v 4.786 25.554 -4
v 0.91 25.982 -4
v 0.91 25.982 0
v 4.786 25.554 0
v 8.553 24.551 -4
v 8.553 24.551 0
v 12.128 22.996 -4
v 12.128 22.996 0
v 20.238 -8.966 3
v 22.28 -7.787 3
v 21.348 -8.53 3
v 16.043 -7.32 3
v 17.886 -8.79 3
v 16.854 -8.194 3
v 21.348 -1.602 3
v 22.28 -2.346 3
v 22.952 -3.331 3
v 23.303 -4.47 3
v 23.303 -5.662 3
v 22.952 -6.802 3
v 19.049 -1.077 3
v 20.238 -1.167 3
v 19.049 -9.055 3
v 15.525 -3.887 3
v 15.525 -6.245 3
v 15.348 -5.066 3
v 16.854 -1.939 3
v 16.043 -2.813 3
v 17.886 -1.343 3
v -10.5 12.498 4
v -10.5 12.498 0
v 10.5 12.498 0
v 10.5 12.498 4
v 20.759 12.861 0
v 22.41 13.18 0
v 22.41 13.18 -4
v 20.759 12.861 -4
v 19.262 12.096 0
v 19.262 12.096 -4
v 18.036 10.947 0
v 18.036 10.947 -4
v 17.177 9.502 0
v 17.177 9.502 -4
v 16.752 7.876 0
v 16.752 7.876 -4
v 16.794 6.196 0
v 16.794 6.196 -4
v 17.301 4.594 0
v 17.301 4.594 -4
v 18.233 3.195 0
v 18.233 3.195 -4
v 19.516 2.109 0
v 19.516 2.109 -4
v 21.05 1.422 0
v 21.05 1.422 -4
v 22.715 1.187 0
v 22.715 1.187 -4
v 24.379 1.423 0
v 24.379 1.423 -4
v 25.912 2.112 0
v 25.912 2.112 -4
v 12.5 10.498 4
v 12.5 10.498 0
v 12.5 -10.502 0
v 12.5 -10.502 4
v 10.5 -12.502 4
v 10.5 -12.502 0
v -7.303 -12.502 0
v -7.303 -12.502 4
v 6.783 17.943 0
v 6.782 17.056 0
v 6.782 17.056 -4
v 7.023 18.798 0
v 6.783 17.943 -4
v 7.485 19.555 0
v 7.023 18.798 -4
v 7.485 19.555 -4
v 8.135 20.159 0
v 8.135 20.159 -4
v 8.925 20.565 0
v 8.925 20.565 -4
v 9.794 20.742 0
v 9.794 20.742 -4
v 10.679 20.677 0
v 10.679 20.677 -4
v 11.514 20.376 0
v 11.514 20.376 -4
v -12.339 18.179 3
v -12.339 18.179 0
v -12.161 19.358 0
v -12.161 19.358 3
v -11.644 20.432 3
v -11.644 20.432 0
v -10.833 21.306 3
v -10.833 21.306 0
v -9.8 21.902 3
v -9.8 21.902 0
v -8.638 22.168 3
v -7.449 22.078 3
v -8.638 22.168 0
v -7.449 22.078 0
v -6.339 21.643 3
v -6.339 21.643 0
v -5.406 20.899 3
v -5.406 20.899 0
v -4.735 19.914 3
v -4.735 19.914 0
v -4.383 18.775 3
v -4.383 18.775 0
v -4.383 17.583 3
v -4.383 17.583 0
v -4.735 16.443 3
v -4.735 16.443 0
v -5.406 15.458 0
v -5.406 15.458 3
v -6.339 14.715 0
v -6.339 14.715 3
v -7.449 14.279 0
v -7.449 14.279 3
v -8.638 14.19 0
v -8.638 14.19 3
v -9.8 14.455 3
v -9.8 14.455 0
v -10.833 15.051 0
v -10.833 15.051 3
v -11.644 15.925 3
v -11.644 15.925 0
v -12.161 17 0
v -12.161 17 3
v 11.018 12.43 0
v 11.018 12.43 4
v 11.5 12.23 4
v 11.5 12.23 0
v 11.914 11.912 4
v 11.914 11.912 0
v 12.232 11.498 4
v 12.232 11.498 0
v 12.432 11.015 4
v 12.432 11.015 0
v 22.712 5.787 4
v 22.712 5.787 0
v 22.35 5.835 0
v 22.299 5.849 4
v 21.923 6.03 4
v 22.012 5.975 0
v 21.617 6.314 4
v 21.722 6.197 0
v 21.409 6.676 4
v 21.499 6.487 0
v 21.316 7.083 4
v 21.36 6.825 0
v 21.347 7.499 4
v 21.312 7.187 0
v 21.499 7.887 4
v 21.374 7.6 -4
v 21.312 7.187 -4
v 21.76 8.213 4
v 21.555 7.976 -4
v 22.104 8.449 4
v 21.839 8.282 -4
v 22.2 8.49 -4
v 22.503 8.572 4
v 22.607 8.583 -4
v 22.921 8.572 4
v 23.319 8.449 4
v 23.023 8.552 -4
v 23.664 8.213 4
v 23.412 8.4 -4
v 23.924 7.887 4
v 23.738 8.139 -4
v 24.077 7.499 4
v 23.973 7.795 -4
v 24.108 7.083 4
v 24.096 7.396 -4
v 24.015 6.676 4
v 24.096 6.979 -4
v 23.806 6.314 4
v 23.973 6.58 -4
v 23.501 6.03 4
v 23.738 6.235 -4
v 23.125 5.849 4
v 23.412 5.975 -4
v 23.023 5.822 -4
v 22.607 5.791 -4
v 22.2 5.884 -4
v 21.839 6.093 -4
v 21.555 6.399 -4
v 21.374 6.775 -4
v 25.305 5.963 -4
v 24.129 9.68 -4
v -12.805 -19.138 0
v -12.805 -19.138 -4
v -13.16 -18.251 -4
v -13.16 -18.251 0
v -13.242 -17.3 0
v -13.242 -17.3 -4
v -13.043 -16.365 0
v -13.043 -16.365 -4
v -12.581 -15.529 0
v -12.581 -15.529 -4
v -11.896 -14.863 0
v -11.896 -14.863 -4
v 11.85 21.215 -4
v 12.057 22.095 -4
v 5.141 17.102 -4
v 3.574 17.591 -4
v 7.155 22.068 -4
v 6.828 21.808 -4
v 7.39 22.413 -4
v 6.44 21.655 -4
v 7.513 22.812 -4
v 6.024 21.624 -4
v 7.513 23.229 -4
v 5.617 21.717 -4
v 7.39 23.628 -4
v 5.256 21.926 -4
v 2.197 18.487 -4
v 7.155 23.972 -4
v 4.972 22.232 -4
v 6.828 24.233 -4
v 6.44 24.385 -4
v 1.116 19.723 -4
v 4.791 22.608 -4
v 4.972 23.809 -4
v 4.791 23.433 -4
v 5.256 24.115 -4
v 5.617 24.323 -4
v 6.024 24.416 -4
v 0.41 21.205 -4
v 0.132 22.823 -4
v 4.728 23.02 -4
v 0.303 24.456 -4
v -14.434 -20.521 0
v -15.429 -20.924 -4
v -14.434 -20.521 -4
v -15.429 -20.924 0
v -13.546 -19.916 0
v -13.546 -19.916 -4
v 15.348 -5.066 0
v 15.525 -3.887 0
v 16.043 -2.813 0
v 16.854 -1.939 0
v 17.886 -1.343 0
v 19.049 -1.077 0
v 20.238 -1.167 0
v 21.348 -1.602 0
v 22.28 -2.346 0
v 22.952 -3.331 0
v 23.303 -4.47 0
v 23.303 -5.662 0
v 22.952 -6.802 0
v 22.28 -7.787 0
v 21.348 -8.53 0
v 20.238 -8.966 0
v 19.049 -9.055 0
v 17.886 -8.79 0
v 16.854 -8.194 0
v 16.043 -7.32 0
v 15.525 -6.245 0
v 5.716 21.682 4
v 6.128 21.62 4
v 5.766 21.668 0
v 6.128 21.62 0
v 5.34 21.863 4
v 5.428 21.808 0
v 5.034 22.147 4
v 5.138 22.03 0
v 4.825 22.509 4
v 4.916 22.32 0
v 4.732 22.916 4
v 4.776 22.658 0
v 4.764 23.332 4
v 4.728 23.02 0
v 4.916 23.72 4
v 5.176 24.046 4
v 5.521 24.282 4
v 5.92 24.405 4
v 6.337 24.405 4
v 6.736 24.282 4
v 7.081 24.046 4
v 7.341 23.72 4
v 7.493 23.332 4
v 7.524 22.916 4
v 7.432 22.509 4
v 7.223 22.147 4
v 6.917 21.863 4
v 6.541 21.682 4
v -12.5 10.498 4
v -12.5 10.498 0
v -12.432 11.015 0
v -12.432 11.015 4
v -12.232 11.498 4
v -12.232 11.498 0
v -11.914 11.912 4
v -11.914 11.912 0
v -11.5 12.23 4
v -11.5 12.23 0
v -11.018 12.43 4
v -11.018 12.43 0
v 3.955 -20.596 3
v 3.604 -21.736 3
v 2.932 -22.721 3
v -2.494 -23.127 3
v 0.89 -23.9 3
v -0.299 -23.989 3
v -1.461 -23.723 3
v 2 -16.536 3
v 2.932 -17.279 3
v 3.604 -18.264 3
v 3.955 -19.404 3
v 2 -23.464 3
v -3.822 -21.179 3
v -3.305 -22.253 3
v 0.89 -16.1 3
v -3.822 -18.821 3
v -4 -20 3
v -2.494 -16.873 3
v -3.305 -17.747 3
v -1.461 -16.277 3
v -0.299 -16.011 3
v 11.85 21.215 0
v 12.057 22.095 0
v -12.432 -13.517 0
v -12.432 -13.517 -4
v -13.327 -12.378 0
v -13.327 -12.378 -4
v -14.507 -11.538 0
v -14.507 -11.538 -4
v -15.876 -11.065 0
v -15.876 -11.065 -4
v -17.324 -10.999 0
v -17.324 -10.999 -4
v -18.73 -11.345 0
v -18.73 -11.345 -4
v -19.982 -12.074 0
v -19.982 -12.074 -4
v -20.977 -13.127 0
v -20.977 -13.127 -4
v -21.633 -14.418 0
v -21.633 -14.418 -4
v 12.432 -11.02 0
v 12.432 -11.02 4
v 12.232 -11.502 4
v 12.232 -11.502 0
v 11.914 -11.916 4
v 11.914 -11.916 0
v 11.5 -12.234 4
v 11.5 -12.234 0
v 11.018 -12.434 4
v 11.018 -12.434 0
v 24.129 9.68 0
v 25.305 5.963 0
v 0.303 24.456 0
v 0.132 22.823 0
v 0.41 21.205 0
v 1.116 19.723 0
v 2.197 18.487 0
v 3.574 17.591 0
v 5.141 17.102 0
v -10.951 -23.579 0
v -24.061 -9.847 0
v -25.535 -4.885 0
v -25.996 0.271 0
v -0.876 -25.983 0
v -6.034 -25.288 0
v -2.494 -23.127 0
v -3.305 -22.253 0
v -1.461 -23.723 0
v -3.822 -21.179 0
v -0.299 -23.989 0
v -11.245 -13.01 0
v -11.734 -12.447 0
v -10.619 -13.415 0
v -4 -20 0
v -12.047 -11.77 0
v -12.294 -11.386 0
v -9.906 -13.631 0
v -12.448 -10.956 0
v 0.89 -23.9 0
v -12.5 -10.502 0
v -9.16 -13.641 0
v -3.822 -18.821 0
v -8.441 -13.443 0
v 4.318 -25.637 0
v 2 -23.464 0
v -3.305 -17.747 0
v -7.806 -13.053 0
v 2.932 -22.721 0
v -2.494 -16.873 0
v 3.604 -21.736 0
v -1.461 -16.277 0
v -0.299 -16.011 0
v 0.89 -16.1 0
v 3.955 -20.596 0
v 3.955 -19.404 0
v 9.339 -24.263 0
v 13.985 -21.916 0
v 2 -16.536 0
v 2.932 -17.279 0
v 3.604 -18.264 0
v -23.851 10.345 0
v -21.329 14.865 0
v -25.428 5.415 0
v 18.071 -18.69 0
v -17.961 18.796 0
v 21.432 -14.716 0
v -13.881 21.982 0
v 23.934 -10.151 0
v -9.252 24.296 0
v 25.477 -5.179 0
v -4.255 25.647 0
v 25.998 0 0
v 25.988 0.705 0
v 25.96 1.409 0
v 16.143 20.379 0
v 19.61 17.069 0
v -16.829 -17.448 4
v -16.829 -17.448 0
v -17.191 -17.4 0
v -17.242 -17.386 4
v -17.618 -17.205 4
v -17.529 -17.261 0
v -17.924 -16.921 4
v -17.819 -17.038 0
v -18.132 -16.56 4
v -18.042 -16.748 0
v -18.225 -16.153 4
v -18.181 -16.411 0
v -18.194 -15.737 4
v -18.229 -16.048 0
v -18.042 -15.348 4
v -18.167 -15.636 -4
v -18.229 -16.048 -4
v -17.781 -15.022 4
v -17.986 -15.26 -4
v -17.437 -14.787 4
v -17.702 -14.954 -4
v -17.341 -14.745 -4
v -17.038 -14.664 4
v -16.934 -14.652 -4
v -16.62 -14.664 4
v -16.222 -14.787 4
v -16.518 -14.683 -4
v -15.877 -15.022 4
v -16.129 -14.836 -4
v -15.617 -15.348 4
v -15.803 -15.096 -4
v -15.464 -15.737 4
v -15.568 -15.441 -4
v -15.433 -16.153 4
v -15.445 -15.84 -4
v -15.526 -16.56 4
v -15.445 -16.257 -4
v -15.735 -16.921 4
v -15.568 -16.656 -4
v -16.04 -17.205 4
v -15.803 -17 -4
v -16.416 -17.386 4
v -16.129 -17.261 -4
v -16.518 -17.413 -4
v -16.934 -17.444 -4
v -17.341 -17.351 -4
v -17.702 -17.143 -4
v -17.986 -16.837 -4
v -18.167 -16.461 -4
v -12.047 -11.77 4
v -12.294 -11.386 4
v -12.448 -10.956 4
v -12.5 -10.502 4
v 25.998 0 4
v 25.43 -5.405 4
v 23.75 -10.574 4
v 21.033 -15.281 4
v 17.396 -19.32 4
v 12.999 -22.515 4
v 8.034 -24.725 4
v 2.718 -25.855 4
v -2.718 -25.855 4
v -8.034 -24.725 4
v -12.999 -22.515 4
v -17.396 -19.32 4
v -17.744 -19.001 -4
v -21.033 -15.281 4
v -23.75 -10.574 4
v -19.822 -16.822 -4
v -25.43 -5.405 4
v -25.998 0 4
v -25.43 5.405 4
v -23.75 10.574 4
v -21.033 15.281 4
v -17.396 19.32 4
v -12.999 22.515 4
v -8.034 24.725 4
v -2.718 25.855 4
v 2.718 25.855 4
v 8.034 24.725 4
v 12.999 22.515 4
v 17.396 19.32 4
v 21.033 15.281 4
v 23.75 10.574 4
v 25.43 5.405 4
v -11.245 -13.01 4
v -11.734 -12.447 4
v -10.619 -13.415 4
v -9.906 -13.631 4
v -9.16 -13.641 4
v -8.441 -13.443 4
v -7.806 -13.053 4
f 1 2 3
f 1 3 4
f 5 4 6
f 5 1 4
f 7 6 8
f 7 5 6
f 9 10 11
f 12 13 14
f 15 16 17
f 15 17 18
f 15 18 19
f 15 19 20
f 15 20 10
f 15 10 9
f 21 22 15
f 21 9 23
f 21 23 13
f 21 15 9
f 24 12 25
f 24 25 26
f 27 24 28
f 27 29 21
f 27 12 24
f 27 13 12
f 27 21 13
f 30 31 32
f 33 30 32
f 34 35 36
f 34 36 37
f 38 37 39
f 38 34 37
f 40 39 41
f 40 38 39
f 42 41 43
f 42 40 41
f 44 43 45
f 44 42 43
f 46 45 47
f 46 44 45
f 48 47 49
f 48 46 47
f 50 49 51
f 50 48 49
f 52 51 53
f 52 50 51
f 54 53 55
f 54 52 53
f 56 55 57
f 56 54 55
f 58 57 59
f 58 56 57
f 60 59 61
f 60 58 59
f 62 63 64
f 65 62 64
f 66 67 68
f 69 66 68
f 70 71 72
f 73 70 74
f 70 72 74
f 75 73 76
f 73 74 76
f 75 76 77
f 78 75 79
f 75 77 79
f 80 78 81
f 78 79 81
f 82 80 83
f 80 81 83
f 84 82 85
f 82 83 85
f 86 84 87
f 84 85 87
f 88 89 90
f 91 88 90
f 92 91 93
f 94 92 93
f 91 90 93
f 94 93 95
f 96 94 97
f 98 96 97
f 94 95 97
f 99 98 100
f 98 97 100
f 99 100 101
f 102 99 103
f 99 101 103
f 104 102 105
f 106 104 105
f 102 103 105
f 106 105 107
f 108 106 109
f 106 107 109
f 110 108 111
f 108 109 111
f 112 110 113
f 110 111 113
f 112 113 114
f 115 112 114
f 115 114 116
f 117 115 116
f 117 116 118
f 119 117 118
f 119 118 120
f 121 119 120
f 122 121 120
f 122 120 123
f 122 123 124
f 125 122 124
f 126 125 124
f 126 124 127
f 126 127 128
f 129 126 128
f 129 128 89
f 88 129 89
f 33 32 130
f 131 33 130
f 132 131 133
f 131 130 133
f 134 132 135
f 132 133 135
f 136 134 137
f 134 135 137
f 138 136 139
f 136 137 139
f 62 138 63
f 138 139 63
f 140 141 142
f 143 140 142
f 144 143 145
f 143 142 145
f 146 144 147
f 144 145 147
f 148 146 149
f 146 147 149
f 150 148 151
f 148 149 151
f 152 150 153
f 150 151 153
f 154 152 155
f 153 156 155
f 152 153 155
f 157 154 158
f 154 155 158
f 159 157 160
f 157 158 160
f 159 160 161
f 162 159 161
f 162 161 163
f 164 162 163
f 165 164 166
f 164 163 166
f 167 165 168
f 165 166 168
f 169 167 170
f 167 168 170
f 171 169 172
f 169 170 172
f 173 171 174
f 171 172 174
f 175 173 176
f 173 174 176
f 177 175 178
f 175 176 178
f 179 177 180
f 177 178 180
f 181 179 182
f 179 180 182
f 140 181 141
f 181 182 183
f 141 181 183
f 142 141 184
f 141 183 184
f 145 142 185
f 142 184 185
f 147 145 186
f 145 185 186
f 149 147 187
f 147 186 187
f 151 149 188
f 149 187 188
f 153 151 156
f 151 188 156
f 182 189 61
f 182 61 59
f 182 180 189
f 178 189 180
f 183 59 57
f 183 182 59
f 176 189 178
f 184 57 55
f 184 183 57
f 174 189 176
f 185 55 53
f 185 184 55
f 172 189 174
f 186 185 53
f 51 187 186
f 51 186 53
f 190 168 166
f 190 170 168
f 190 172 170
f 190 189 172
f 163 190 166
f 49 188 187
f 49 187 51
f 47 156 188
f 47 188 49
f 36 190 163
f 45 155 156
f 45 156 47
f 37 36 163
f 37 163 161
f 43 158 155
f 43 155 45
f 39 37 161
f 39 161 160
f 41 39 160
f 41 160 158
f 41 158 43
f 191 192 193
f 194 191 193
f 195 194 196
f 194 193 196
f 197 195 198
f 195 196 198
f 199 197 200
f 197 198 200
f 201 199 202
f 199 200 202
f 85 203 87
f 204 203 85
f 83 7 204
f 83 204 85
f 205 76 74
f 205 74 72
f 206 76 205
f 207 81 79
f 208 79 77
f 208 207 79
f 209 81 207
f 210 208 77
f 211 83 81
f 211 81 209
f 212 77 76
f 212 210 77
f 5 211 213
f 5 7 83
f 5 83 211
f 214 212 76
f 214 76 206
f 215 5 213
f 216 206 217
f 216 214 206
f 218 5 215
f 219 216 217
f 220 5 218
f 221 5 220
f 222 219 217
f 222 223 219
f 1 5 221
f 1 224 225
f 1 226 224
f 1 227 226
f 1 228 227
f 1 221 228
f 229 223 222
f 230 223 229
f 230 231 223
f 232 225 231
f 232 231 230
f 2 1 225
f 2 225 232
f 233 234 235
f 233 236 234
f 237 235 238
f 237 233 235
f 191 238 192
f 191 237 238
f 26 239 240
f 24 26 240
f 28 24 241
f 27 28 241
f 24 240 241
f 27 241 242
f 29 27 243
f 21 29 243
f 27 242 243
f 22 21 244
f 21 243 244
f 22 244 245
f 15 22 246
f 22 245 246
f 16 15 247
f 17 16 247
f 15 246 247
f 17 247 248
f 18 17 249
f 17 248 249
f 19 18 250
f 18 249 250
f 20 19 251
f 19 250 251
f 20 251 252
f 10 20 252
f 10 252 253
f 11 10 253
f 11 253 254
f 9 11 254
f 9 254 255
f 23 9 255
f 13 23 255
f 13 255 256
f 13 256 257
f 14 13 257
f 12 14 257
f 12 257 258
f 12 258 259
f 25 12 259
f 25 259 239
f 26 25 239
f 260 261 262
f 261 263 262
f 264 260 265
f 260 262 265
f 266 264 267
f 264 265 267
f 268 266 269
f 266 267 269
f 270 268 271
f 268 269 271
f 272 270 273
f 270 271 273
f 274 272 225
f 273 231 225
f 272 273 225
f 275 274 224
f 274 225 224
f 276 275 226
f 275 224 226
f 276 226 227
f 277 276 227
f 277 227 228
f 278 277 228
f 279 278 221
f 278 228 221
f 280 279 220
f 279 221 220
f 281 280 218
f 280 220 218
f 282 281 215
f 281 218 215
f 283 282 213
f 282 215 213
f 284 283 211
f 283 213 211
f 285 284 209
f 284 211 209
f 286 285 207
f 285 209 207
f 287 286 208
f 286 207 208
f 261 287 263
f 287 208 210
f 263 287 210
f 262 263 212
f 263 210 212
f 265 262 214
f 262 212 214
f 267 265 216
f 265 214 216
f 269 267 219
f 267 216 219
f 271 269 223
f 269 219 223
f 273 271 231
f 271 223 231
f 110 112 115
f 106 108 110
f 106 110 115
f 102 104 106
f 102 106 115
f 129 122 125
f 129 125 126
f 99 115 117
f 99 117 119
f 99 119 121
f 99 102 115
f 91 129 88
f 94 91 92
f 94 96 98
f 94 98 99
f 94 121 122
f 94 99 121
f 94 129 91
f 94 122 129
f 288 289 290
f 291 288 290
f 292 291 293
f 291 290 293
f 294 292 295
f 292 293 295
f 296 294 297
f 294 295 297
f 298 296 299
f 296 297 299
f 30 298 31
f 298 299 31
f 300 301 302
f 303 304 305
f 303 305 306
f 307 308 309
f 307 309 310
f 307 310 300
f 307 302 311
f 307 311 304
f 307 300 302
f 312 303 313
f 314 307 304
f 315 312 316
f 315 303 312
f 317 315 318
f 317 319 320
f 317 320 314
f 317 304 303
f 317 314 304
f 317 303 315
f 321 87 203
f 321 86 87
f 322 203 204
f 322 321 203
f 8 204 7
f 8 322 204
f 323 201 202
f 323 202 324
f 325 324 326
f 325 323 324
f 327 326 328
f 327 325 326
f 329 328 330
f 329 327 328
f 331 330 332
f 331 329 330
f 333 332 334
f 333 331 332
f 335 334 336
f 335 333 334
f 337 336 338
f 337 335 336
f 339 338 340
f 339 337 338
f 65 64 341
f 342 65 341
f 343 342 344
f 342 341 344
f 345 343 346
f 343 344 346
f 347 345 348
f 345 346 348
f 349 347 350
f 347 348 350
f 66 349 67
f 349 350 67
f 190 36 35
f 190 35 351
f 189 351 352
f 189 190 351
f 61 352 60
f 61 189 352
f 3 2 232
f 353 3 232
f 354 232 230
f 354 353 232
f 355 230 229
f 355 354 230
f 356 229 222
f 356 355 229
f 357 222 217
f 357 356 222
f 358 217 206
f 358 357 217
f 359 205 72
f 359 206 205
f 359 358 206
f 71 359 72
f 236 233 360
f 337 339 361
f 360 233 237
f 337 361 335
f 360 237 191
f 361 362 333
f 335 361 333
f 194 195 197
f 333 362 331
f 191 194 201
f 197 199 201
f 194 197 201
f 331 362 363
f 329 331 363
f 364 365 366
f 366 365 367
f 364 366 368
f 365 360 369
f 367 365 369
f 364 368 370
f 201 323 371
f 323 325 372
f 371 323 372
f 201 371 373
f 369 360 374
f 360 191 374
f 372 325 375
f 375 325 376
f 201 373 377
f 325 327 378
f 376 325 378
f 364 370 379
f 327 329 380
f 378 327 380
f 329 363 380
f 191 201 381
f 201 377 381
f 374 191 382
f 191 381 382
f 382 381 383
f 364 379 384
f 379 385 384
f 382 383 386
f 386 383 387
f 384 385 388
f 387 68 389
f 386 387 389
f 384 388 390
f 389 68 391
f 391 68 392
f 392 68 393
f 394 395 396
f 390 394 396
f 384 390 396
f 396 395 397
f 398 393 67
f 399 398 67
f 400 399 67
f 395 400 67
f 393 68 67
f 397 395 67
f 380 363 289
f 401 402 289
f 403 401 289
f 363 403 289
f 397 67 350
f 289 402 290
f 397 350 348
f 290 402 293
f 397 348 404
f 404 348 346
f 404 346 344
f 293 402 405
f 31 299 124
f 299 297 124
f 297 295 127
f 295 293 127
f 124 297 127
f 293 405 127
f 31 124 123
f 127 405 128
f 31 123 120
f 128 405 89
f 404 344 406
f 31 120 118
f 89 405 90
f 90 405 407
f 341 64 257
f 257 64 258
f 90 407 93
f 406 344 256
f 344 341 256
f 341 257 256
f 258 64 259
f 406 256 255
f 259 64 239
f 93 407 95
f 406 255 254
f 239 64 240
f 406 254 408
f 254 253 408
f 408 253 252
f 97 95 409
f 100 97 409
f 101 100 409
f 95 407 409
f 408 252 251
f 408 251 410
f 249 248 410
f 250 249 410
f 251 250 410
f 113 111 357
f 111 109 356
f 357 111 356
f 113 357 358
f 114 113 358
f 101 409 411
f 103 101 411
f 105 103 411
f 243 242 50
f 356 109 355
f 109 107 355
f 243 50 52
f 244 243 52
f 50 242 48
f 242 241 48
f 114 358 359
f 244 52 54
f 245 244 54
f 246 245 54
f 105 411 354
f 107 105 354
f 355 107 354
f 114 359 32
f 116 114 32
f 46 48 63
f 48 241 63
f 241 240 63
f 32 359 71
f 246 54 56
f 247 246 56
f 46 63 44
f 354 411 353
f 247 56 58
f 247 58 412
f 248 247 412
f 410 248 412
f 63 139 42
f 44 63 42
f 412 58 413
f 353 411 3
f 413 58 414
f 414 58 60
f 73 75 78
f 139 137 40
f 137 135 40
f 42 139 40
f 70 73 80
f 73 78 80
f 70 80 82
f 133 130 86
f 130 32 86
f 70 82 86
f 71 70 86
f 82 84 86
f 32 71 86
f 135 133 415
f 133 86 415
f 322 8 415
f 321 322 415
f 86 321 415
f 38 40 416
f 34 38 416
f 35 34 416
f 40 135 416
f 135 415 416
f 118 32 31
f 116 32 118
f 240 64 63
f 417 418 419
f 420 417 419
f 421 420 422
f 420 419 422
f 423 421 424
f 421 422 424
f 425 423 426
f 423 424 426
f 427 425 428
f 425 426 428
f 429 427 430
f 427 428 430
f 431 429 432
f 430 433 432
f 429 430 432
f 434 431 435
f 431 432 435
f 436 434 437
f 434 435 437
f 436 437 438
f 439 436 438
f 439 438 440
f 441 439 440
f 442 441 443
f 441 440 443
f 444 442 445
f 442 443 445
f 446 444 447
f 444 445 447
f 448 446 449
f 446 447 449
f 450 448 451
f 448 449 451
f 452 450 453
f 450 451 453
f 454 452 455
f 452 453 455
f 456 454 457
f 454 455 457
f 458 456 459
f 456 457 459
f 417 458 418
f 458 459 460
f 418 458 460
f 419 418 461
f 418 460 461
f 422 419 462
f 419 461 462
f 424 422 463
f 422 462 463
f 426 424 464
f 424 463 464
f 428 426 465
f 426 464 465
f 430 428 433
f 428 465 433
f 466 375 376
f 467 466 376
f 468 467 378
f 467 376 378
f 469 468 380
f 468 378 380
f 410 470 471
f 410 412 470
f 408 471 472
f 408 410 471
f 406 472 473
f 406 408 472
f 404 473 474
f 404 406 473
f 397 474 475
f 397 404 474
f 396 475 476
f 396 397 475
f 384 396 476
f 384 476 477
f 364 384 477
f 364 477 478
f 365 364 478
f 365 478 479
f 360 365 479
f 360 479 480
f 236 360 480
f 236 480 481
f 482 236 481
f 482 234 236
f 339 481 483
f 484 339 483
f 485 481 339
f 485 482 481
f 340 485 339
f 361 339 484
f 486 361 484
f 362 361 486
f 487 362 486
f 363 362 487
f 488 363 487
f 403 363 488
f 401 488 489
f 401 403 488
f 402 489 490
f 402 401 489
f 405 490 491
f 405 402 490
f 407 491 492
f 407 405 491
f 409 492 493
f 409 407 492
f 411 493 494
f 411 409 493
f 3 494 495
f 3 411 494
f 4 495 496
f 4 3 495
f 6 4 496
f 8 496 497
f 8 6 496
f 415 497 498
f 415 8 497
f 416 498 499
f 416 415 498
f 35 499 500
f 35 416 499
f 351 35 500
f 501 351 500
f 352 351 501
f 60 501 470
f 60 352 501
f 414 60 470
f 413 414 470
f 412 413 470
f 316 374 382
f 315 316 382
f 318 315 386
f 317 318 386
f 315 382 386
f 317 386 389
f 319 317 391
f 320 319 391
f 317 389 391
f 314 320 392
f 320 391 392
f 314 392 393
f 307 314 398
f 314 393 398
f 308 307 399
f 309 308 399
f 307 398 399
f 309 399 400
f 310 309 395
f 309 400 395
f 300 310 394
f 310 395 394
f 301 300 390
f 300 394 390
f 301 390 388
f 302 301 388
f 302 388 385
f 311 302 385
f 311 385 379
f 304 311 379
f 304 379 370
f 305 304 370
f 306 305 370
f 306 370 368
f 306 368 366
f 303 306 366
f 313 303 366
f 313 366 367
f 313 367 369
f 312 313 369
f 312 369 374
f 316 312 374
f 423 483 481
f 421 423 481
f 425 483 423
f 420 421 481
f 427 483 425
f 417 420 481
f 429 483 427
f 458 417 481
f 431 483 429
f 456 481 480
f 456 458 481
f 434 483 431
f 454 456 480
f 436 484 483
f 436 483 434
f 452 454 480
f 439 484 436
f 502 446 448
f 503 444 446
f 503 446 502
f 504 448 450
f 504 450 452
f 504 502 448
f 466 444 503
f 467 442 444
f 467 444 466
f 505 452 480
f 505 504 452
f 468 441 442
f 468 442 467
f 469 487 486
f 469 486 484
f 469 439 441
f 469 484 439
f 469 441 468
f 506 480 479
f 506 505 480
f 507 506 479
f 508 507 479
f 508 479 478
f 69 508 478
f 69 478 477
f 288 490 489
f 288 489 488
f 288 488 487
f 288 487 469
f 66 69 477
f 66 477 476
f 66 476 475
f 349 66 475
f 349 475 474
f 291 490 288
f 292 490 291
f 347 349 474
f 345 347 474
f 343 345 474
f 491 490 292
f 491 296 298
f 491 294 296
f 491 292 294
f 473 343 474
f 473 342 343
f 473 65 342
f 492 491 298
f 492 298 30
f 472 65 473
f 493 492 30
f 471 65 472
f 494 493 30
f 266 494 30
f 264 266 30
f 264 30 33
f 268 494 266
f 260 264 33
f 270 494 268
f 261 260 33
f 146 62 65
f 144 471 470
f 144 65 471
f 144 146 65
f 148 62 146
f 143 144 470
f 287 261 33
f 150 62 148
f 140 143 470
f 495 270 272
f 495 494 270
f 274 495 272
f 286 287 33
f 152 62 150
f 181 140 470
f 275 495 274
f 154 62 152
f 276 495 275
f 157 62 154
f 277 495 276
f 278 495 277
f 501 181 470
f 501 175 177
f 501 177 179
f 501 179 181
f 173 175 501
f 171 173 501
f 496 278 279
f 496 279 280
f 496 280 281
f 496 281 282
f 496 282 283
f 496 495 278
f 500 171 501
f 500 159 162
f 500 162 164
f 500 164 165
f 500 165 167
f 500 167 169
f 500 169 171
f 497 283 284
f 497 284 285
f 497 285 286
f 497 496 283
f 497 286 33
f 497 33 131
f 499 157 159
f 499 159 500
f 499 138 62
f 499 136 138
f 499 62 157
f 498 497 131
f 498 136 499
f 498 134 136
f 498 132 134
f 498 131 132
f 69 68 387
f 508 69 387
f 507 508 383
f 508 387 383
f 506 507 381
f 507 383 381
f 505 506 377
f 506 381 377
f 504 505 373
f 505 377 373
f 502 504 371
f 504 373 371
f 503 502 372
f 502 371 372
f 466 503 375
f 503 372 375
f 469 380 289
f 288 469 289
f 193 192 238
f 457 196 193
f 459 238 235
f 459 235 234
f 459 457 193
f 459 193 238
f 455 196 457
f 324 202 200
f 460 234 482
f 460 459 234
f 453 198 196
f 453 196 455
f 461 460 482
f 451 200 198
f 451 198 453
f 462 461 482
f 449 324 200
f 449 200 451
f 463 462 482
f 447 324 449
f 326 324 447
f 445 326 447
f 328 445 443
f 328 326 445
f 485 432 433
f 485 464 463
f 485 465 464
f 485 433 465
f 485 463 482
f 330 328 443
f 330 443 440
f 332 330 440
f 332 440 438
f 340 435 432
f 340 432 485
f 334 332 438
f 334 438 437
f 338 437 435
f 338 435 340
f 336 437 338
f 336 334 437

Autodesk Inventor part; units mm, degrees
ref_plane "YZ Plane" through (0, 0, 0) normal (1, 0, 0) x (0, 1, 0)
ref_plane "XZ Plane" through (0, 0, 0) normal (0, 1, 0) x (-1, 0, 0)
ref_plane "XY Plane" through (0, 0, 0) normal (0, 0, 1) x (1, 0, 0)
ref_plane "Work Plane1" through (0, 0, 0) normal (0, 0, 1) x (1, 0, 0)
sketch "Sketch1" plane through (0, 0, 0) normal (0, 0, 1) x (1, 0, 0)
  circle A0 centre (0, 0) radius 25.9979 projected
  circle A1 centre (-9.4998, -11.0022) radius 2.6601 projected
  circle A2 centre (0.0001, -0.0022) radius 3.8801 projected
  circle A3 centre (0.0001, -0.0022) radius 6.7754 projected
  line L0 (10.5001, -12.5022) -> (-10.4999, -12.5022)
  line L1 (-12.4999, -10.5022) -> (-12.4999, 10.4978)
  line L2 (-10.4999, 12.4978) -> (10.5001, 12.4978)
  line L3 (12.5001, 10.4978) -> (12.5001, -10.5022)
  line L4 (12.5001, -12.5022) -> (-12.4999, 12.4978) construction
  line L5 (-12.4999, -12.5022) -> (12.5001, 12.4978) construction
  arc A4 (-10.4999, 12.4978) -> (-12.4999, 10.4978) centre (-10.4999, 10.4978) ccw
  arc A5 (-12.4999, -10.5022) -> (-10.4999, -12.5022) centre (-10.4999, -10.5022) ccw
  arc A6 (10.5001, -12.5022) -> (12.5001, -10.5022) centre (10.5001, -10.5022) ccw
  arc A7 (12.5001, 10.4978) -> (10.5001, 12.4978) centre (10.5001, 10.4978) ccw
  point P0 (0, 0)
  point P1 (-7.3029, -12.5022)
  point P2 (-12.0467, -11.77)
  dimension "d17" = 25
  dimension "d18" = 25
  dimension "d19" = 2
extrude "Extrusion1" add sketch "Sketch1" along normal blind 4 contours A0
sketch "Skizze4" plane through (0, 0, 4) normal (0, 0, 1) x (1, 0, 0)
  spline S0 degree 2 poles (24.1427, 2.2394) (24.731, 1.8489) (25.3785, 0.5587) (25.3785, -0.3311) knots 0 0 0 1 2 2 2 construction
  spline S1 degree 2 poles (25.3785, -0.3311) (25.3785, -1.1665) (24.7013, -2.5111) (24.1328, -2.8867) knots 0 0 0 1 2 2 2 construction
  spline S2 degree 2 poles (24.1328, -2.8867) (23.6682, -3.1784) (22.7141, -3.3761) (21.9726, -3.3761) knots 0 0 0 1 2 2 2 construction
  line L0 (21.9726, -3.3761) -> (20.5687, -3.3761) construction
  line L1 (20.5687, -3.3761) -> (20.5687, 2.7239) construction
  line L2 (20.5687, 2.7239) -> (21.9578, 2.7239) construction
  spline S3 degree 2 poles (21.9578, 2.7239) (22.8179, 2.7239) (23.7967, 2.4668) (24.1427, 2.2394) knots 0 0 0 1 2 2 2 construction
  spline S4 degree 2 poles (19.1896, -2.9312) (18.8979, -3.1982) (18.1564, -3.4849) (17.5978, -3.4849) knots 0 0 0 1 2 2 2 construction
  spline S5 degree 2 poles (17.5978, -3.4849) (16.9354, -3.4849) (16.0061, -3.2081) (15.5958, -3.0103) knots 0 0 0 1 2 2 2 construction
  line L3 (15.5958, -3.0103) -> (15.5958, -1.992) construction
  line L4 (15.5958, -1.992) -> (15.6551, -1.992) construction
  spline S6 degree 2 poles (15.6551, -1.992) (16.0555, -2.3677) (17.0689, -2.7829) (17.5385, -2.7829) knots 0 0 0 1 2 2 2 construction
  spline S7 degree 2 poles (17.5385, -2.7829) (18.2108, -2.7829) (18.8979, -2.2243) (18.8979, -1.7646) knots 0 0 0 1 2 2 2 construction
  spline S8 degree 2 poles (18.8979, -1.7646) (18.8979, -1.3988) (18.5371, -0.944) (18.1465, -0.8303) knots 0 0 0 1 2 2 2 construction
  spline S9 degree 2 poles (18.1465, -0.8303) (17.8648, -0.7513) (17.3952, -0.6425) (17.0442, -0.5535) knots 0 0 0 1 2 2 2 construction
  spline S10 degree 2 poles (17.0442, -0.5535) (16.7278, -0.4695) (16.2285, -0.2174) (16.0358, -0.0147) knots 0 0 0 1 2 2 2 construction
  spline S11 degree 2 poles (16.0358, -0.0147) (15.8479, 0.188) (15.6403, 0.7317) (15.6403, 1.0876) knots 0 0 0 1 2 2 2 construction
  spline S12 degree 2 poles (15.6403, 1.0876) (15.6403, 1.8291) (16.797, 2.8326) (17.6918, 2.8326) knots 0 0 0 1 2 2 2 construction
  spline S13 degree 2 poles (17.6918, 2.8326) (18.2059, 2.8326) (19.1154, 2.6299) (19.5059, 2.4372) knots 0 0 0 1 2 2 2 construction
  line L5 (19.5059, 2.4372) -> (19.5059, 1.4683) construction
  line L6 (19.5059, 1.4683) -> (19.4466, 1.4683) construction
  spline S14 degree 2 poles (19.4466, 1.4683) (19.155, 1.7352) (18.2454, 2.1307) (17.7461, 2.1307) knots 0 0 0 1 2 2 2 construction
  spline S15 degree 2 poles (17.7461, 2.1307) (17.1826, 2.1307) (16.4856, 1.6017) (16.4856, 1.1717) knots 0 0 0 1 2 2 2 construction
  spline S16 degree 2 poles (16.4856, 1.1717) (16.4856, 0.7861) (16.8959, 0.3264) (17.2815, 0.2226) knots 0 0 0 1 2 2 2 construction
  spline S17 degree 2 poles (17.2815, 0.2226) (17.5385, 0.1534) (18.285, -0.0246) (18.5321, -0.0987) knots 0 0 0 1 2 2 2 construction
  spline S18 degree 2 poles (18.5321, -0.0987) (19.1599, -0.2915) (19.7432, -1.0676) (19.7432, -1.6361) knots 0 0 0 1 2 2 2 construction
  spline S19 degree 2 poles (19.7432, -1.6361) (19.7432, -1.997) (19.4516, -2.689) (19.1896, -2.9312) knots 0 0 0 1 2 2 2 construction
  circle A0 centre (-9.9998, 17.4978) radius 1.3999 construction
  circle A1 centre (10.0001, 17.4979) radius 1.4 construction
  circle A2 centre (10.0001, -17.5021) radius 1.4 construction
  circle A3 centre (-9.9998, -17.5021) radius 1.4001 construction
  arc A4 (-25.1198, 6.6998) -> (-24.1417, 5.4917) centre (-24.1417, 6.4917) ccw construction
  line L7 (-24.1417, 5.4917) -> (-17.7002, 5.4917) construction
  arc A5 (-15.7002, 3.4917) -> (-17.7002, 5.4917) centre (-17.7002, 3.4917) ccw construction
  line L8 (-15.7002, 3.4917) -> (-15.7002, -4.496) construction
  arc A6 (-17.7002, -6.496) -> (-15.7002, -4.496) centre (-17.7002, -4.496) ccw construction
  line L9 (-17.7002, -6.496) -> (-23.8502, -6.496) construction
  arc A7 (-23.8502, -6.496) -> (-24.8235, -7.7254) centre (-23.8502, -7.496) ccw construction
  arc A8 (-24.8235, -7.7254) -> (-25.1198, 6.6998) centre (0, 0) ccw construction
  circle A9 centre (-9.4998, -11.0022) radius 2.6601 construction
  circle A10 centre (-16.8291, -16.0482) radius 1.4 construction
  circle A11 centre (6.1284, 23.0202) radius 1.4 construction
  circle A12 centre (22.7119, 7.1872) radius 1.4 construction
  circle A13 centre (0.0001, -0.0022) radius 6.5 construction
  point P0 (0, 0)
hole "Bohrung1" at (6.1284, 23.0202, 4) at (22.7119, 7.1872, 4) at (-16.8291, -16.0482, 4) direction (0, 0, -1) diameter 2.8 end through all
sketch "Skizze6" plane through (0, 0, 0) normal (0, 0, -1) x (-1, 0, 0)
  circle A0 centre (-22.7119, 7.1872) radius 1.4 projected
  circle A1 centre (-6.1284, 23.0202) radius 1.4 projected
  circle A2 centre (16.8291, -16.0482) radius 1.4 projected
  circle A3 centre (0, 0) radius 25.9979 projected
  line L0 (12.4999, -10.5022) -> (12.4999, 10.4978) projected
  arc A4 (12.0467, -11.77) -> (12.4999, -10.5022) centre (10.4999, -10.5022) ccw projected
  arc A5 (7.3029, -12.5022) -> (12.0467, -11.77) centre (9.4998, -11.0022) ccw projected
  line L1 (-10.5001, -12.5022) -> (7.3029, -12.5022) projected
  arc A6 (-12.5001, -10.5022) -> (-10.5001, -12.5022) centre (-10.5001, -10.5022) ccw projected
  line L2 (-12.5001, 10.4978) -> (-12.5001, -10.5022) projected
  arc A7 (-10.5001, 12.4978) -> (-12.5001, 10.4978) centre (-10.5001, 10.4978) ccw projected
  line L3 (10.4999, 12.4978) -> (-10.5001, 12.4978) projected
  arc A8 (12.4999, 10.4978) -> (10.4999, 12.4978) centre (10.4999, 10.4978) ccw projected
  arc A9 (21.6334, -14.4182) -> (15.4291, -20.9245) centre (16.8291, -16.0482) ccw
  circle A10 centre (-6.1284, 23.0202) radius 1.4 projected
  circle A11 centre (0, 0) radius 25.9979 projected
  arc A12 (-12.1283, 22.9955) -> (-0.9103, 25.982) centre (-6.1284, 23.0202) ccw
  circle A13 centre (-22.7119, 7.1872) radius 1.4 projected
  arc A14 (-25.912, 2.1118) -> (-22.4096, 13.1796) centre (-22.7119, 7.1872) ccw
  point P0 (0, 0)
  point P1 (-25.912, 2.1118)
  point P2 (-0.9103, 25.982)
  dimension "d20" = 6
  dimension "d21" = 6
extrude "Extrusion4" add sketch "Skizze6" along normal blind 4 contours A12 A3 | A3 A9 | A14 A3
sketch "Skizze7" plane through (0, 0, 0) normal (0, 0, -1) x (-1, 0, 0)
  arc A0 (-25.912, 2.1118) -> (-22.4096, 13.1796) centre (-22.7119, 7.1872) ccw projected
  arc A1 (-25.912, 2.1118) -> (15.4291, -20.9245) centre (0, 0) ccw projected
  arc A2 (21.6334, -14.4182) -> (15.4291, -20.9245) centre (16.8291, -16.0482) ccw projected
  arc A3 (21.6334, -14.4182) -> (-0.9103, 25.982) centre (0, 0) ccw projected
  arc A4 (-12.1283, 22.9955) -> (-0.9103, 25.982) centre (-6.1284, 23.0202) ccw projected
  arc A5 (-12.1283, 22.9955) -> (-22.4096, 13.1796) centre (0, 0) ccw projected
  line L0 (12.4999, -10.5022) -> (12.4999, 10.4978) projected
  arc A6 (12.0467, -11.77) -> (12.4999, -10.5022) centre (10.4999, -10.5022) ccw projected
  arc A7 (7.3029, -12.5022) -> (12.0467, -11.77) centre (9.4998, -11.0022) ccw projected
  line L1 (-10.5001, -12.5022) -> (7.3029, -12.5022) projected
  arc A8 (-12.5001, -10.5022) -> (-10.5001, -12.5022) centre (-10.5001, -10.5022) ccw projected
  line L2 (-12.5001, 10.4978) -> (-12.5001, -10.5022) projected
  arc A9 (-10.5001, 12.4978) -> (-12.5001, 10.4978) centre (-10.5001, 10.4978) ccw projected
  line L3 (10.4999, 12.4978) -> (-10.5001, 12.4978) projected
  arc A10 (12.4999, 10.4978) -> (10.4999, 12.4978) centre (10.4999, 10.4978) ccw projected
  circle A11 centre (8.3387, 18.1787) radius 4
  circle A12 centre (-0.0001, -20) radius 4
  circle A13 centre (-19.3477, -5.0663) radius 4
  circle A14 centre (0, 0) radius 20 construction
  point P0 (0, 0)
  dimension "d24" = 8
  dimension "d25" = 8
  dimension "d26" = 8
  dimension "d29" = 40
extrude "Extrusion5" cut sketch "Skizze7" against normal blind 3 contours A11 | A12 | A13
sketch "Skizze8" plane through (0, 0, -4) normal (0, 0, -1) x (-1, 0, 0)
  circle A0 centre (16.8271, -16.0472) radius 2.75 projected
  circle A1 centre (-22.7139, 7.1882) radius 2.75 projected
  circle A2 centre (-6.1303, 23.0212) radius 2.75 projected
  circle A3 centre (-6.1303, 23.0212) radius 3.25
  circle A4 centre (-22.7139, 7.1882) radius 3.25
  circle A5 centre (16.8271, -16.0472) radius 3.25
  circle A6 centre (-10.002, -17.5012) radius 2.75 projected
  circle A7 centre (9.998, -17.5011) radius 2.75 projected
  circle A8 centre (-10.002, 17.4988) radius 2.75 projected
  circle A9 centre (-10.002, 17.4988) radius 3.25
  circle A10 centre (-10.002, -17.5012) radius 3.25
  circle A11 centre (9.998, -17.5011) radius 3.25
  point P0 (0, 0)
  dimension "d30" = 0.5
  dimension "d31" = 0.5
  dimension "d32" = 0.5
  dimension "d33" = 0.5
  dimension "d34" = 0.5
  dimension "d35" = 0.5
extrude "Extrusion6" cut sketch "Skizze8" against normal up to surface (4 mm away) contours A6 | A7 | A8 | A9 | A10 | A11
properties part number "Anglerfish_flipped_LidMoun"
